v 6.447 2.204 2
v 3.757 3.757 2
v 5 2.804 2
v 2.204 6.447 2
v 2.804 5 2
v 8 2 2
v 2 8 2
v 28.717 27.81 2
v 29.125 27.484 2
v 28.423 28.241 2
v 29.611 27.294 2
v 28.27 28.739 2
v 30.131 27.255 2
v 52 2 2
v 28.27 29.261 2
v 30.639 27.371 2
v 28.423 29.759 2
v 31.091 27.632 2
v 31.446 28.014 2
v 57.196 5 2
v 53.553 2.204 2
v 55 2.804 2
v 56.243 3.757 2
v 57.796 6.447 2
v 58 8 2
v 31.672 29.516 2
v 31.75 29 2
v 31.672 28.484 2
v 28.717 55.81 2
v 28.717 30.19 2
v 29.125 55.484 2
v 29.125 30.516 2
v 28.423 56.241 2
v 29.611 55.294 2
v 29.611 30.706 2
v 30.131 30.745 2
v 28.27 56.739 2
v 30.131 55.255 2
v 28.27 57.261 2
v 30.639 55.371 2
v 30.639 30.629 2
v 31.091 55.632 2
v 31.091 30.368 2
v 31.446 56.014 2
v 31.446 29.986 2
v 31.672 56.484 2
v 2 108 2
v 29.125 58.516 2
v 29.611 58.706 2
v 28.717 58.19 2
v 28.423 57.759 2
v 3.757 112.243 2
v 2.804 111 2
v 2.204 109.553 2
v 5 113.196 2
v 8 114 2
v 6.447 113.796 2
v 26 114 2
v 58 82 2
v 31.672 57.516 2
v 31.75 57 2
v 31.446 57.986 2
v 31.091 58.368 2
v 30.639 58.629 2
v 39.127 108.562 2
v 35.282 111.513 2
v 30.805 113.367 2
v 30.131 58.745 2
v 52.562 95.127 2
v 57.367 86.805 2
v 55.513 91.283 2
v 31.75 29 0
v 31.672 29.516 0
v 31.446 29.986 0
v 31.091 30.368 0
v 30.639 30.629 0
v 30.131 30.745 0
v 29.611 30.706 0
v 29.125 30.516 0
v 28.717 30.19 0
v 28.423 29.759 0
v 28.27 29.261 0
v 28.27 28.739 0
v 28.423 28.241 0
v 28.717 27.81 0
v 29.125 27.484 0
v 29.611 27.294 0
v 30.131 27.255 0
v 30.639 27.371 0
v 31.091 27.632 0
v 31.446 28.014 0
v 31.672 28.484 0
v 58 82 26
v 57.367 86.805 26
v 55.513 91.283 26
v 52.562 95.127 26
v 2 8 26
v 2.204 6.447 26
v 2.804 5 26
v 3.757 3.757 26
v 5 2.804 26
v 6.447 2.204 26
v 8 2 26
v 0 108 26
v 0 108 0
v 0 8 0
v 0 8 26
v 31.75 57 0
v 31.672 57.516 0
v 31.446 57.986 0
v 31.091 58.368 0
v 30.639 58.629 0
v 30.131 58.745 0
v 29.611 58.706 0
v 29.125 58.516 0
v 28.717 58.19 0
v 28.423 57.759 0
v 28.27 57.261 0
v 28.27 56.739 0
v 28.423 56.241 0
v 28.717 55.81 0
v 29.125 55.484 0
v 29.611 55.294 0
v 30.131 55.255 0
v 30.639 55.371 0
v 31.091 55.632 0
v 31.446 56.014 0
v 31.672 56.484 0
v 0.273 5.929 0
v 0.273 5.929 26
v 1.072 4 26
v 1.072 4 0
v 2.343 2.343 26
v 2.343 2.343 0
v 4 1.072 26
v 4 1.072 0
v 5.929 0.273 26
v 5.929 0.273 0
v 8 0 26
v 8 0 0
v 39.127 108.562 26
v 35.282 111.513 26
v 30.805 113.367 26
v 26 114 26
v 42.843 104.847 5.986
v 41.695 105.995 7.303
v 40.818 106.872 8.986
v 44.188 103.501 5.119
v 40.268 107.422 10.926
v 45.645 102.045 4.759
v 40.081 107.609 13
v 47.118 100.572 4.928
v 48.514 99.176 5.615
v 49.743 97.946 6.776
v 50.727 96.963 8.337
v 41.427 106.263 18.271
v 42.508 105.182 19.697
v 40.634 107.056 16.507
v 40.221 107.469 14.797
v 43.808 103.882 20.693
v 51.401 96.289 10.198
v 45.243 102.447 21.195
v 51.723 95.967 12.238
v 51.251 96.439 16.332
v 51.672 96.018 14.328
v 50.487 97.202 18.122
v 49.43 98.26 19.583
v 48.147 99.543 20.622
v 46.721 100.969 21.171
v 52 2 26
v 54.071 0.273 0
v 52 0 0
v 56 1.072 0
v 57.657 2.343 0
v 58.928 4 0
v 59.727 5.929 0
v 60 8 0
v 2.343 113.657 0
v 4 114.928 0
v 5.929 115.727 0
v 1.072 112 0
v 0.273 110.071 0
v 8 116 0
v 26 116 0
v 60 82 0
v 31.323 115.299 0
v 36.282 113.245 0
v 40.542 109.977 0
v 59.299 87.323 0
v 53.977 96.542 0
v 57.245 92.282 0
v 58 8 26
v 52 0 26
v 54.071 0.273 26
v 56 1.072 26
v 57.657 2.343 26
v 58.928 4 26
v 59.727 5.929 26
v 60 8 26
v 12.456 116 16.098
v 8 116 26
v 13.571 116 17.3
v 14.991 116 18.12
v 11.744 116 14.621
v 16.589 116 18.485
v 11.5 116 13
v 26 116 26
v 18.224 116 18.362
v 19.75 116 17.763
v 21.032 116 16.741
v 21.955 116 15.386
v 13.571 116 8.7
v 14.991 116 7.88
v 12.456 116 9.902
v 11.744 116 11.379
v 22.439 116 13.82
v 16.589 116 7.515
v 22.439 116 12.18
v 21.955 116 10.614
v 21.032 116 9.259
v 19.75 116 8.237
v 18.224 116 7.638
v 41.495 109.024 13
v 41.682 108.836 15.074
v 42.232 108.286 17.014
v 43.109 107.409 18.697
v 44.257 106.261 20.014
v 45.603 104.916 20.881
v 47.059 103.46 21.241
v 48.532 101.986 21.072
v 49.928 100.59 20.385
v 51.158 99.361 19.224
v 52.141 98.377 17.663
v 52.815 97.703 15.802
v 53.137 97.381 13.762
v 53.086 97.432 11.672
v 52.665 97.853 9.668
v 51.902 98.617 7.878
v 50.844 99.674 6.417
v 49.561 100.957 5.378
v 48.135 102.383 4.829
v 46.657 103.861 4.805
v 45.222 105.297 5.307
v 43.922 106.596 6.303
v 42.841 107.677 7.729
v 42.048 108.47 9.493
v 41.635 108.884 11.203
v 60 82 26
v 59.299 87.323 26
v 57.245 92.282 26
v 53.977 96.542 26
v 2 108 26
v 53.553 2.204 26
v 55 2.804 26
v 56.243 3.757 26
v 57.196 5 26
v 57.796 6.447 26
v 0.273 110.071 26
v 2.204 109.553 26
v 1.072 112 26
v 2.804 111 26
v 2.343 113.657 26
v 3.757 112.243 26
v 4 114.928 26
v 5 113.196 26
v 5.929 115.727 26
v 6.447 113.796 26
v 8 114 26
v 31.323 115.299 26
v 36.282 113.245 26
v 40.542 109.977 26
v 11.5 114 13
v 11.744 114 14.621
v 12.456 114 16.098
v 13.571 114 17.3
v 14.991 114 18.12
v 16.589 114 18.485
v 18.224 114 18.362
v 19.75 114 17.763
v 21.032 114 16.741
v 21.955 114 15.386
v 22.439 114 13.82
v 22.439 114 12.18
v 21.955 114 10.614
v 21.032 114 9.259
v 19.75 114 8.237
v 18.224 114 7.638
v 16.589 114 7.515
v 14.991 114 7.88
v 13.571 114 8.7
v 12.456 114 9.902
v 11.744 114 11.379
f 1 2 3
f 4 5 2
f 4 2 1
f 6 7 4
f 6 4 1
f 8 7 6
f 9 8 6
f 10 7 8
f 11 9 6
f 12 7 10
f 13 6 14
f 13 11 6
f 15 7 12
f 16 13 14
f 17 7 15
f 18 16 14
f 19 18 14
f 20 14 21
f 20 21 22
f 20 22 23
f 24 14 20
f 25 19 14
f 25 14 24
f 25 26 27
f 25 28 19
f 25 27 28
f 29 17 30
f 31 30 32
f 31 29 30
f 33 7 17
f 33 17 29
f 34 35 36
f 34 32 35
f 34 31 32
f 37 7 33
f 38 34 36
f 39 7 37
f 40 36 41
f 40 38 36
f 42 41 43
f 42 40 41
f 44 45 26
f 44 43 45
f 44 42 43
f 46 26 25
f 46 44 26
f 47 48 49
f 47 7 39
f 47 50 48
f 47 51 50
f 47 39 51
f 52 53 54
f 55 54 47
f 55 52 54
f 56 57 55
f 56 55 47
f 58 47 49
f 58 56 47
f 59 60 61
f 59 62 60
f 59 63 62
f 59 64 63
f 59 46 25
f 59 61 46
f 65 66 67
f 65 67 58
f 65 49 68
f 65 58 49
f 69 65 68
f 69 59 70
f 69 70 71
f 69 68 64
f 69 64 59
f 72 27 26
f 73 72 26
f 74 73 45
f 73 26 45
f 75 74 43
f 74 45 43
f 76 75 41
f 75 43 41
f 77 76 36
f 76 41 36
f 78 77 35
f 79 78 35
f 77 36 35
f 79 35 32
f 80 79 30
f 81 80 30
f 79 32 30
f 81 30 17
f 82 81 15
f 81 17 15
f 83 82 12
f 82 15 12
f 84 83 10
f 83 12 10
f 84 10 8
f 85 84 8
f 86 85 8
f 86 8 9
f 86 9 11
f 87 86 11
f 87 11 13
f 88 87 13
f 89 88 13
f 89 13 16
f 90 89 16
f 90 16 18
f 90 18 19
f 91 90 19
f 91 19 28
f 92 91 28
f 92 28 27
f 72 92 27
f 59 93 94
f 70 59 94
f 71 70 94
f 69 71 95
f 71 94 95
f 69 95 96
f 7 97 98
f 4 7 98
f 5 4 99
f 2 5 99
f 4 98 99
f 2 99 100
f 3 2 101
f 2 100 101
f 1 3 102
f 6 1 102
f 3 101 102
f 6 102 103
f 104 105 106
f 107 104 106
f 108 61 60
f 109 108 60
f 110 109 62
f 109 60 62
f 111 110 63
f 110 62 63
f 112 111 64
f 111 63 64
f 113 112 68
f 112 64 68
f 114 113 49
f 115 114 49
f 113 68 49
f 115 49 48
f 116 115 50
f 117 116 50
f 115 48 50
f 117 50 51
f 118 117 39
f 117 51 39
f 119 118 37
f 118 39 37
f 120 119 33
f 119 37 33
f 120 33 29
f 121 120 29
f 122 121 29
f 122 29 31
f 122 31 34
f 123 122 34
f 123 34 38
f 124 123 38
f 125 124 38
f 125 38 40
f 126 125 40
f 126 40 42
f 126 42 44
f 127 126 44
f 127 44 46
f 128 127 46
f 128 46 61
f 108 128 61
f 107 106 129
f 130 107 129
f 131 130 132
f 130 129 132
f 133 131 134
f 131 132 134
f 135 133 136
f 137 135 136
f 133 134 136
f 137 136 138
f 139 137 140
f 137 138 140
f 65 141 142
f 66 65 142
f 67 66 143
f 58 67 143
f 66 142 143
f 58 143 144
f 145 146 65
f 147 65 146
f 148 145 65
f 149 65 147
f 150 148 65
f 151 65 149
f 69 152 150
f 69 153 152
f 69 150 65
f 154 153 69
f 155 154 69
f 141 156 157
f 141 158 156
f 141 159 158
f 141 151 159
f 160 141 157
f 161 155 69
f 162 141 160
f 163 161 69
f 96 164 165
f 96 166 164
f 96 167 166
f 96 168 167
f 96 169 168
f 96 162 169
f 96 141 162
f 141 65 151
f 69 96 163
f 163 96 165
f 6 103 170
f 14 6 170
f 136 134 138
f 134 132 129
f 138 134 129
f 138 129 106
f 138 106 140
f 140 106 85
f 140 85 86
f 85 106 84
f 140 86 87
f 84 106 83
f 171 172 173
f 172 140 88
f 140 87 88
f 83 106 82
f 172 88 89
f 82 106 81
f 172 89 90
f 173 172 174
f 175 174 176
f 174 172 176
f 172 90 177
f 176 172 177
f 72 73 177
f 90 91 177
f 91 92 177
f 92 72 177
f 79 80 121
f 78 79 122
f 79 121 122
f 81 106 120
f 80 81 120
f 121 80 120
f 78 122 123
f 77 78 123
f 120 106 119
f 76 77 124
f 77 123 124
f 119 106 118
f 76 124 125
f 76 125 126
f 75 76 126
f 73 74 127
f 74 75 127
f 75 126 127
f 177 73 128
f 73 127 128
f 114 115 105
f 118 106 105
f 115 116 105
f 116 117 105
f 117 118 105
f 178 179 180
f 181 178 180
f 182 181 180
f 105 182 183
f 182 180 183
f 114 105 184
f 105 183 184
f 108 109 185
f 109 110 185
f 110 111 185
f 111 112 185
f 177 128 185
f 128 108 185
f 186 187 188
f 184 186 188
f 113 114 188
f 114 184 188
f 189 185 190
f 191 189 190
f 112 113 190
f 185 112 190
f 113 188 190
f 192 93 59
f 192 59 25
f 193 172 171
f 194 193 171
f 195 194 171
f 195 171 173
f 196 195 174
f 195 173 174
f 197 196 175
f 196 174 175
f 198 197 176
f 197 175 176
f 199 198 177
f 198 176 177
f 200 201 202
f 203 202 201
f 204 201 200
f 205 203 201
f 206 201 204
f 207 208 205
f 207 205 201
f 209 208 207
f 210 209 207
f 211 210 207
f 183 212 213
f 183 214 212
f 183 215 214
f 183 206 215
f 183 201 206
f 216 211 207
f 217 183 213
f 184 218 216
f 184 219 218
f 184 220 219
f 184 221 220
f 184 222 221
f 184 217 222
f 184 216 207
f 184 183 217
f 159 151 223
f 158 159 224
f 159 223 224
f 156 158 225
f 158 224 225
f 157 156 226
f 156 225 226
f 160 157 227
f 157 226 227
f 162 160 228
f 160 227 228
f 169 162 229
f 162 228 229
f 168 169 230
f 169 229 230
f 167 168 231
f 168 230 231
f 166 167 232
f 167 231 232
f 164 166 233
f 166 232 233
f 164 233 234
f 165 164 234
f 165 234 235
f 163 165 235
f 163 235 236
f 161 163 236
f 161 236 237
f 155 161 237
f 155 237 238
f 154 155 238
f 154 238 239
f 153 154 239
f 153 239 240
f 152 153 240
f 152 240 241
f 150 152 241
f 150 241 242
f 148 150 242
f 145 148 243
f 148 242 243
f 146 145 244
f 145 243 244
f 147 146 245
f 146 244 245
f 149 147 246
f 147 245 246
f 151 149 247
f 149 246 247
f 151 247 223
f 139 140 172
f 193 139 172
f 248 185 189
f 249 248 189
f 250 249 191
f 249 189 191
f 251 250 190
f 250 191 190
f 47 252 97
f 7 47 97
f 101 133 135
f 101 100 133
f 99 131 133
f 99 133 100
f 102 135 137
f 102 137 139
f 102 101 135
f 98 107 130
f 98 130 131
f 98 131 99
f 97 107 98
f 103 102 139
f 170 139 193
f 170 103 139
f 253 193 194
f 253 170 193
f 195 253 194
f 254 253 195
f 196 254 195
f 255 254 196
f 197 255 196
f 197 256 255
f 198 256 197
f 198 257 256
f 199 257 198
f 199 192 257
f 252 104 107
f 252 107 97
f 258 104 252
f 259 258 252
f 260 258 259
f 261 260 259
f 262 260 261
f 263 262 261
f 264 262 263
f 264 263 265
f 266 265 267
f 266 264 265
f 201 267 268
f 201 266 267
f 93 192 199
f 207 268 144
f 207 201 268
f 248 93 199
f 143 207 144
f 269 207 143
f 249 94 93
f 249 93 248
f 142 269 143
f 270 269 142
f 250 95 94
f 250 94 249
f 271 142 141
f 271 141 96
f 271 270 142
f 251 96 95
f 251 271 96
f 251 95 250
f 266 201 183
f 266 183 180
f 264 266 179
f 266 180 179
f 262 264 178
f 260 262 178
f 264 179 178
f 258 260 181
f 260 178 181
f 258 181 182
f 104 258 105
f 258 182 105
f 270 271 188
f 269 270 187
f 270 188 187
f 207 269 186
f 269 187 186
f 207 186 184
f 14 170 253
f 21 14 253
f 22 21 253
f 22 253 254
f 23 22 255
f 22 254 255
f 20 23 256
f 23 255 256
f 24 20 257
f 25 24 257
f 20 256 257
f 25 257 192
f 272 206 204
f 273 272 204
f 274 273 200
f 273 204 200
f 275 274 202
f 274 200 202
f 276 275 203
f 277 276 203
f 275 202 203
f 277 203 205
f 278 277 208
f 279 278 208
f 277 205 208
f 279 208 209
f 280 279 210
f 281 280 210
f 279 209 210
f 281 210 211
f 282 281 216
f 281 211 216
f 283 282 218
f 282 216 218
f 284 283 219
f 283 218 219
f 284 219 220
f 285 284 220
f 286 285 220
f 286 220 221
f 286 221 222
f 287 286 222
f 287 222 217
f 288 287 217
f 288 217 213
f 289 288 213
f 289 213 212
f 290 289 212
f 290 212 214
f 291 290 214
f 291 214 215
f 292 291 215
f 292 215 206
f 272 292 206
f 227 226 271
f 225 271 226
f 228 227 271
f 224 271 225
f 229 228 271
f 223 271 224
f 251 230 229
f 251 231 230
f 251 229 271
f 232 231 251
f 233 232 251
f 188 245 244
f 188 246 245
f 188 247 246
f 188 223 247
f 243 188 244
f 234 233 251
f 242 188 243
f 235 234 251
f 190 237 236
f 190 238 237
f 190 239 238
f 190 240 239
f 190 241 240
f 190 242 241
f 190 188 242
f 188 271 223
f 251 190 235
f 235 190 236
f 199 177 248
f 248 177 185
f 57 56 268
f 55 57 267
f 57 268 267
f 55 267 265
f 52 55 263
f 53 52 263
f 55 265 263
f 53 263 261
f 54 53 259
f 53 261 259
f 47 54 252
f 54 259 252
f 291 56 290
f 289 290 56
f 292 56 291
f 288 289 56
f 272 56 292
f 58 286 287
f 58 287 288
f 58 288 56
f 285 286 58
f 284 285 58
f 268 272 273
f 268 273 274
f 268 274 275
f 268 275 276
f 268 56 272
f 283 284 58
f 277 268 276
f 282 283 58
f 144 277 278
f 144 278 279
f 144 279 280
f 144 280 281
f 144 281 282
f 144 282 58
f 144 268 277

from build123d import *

# Parameters (mm, degrees)
PAD_DEPTH       = 26
POCKET_DEPTH    = 24
SKETCH002_R     = 8.25
POCKET001_DEPTH = 3
SKETCH003_R     = 5.5
POCKET002_DEPTH = 3
SKETCH004_R     = 1.75
POCKET003_DEPTH = 5


with BuildPart() as part:
    # Sketch → Pad (new body)
    with BuildSketch(Plane.XY):
        with BuildLine():
            Line((60, 8), (60, 82.000001))
            ThreePointArc((60, 82.000001), (58.434586, 89.869877), (53.976662, 96.541638))
            Line((40.541631, 109.976664), (53.976662, 96.541638))
            ThreePointArc((40.541631, 109.976664), (33.869872, 114.434584), (25.999999, 115.999997))
            Line((7.999999, 115.999997), (25.999999, 115.999997))
            ThreePointArc((7.999999, 115.999997), (2.343146, 113.656851), (0, 107.999998))
            Line((0, 107.999998), (0, 8))
            ThreePointArc((0, 8), (2.343146, 2.343146), (8, 0))
            Line((8, 0), (52, 0))
            ThreePointArc((52, 0), (57.656854, 2.343146), (60, 8))
        make_face()
    extrude(amount=PAD_DEPTH)

    # Sketch001 → Pocket (cut)
    with BuildSketch(Plane.XY.offset(26)):
        with BuildLine():
            ThreePointArc((8.00001, 113.999998), (3.757363, 112.242642), (2, 107.999998))
            Line((2, 107.999998), (2, 8))
            ThreePointArc((2, 8), (3.757359, 3.757359), (8, 2))
            Line((8, 2), (52, 2))
            ThreePointArc((52, 2), (56.242642, 3.757359), (58.000001, 8))
            Line((58.000001, 82), (58.000001, 8))
            ThreePointArc((58.000001, 82), (56.586824, 89.104519), (52.562435, 95.127438))
            Line((39.127419, 108.562437), (52.562435, 95.127438))
            ThreePointArc((39.127419, 108.562437), (33.104503, 112.586822), (25.99999, 113.999998))
            Line((8.00001, 113.999998), (25.99999, 113.999998))
        make_face()
    extrude(amount=-POCKET_DEPTH, mode=Mode.SUBTRACT)

    # Sketch002 → Pocket001 (cut)
    with BuildSketch(Plane(origin=(75.259141, 75.259166, 0), x_dir=(-0.707107, 0.707107, 0), z_dir=(0.707107, 0.707107, 0))):
        with Locations((39.5, 13)):
            Circle(SKETCH002_R)
    extrude(amount=-POCKET001_DEPTH, mode=Mode.SUBTRACT)

    # Sketch003 → Pocket002 (cut)
    with BuildSketch(Plane(origin=(0, 115.999997, 0), x_dir=(-1, 0, 0), z_dir=(0, 1, 0))):
        with Locations((-17, 13)):
            Circle(SKETCH003_R)
    extrude(amount=-POCKET002_DEPTH, mode=Mode.SUBTRACT)

    # Sketch004 → Pocket003 (cut)
    with BuildSketch(Plane.XY.offset(2)):
        with Locations((30, 29)):
            Circle(SKETCH004_R)
        with Locations((30, 57)):
            Circle(SKETCH004_R)
    extrude(amount=-POCKET003_DEPTH, mode=Mode.SUBTRACT)


solid = part.part
